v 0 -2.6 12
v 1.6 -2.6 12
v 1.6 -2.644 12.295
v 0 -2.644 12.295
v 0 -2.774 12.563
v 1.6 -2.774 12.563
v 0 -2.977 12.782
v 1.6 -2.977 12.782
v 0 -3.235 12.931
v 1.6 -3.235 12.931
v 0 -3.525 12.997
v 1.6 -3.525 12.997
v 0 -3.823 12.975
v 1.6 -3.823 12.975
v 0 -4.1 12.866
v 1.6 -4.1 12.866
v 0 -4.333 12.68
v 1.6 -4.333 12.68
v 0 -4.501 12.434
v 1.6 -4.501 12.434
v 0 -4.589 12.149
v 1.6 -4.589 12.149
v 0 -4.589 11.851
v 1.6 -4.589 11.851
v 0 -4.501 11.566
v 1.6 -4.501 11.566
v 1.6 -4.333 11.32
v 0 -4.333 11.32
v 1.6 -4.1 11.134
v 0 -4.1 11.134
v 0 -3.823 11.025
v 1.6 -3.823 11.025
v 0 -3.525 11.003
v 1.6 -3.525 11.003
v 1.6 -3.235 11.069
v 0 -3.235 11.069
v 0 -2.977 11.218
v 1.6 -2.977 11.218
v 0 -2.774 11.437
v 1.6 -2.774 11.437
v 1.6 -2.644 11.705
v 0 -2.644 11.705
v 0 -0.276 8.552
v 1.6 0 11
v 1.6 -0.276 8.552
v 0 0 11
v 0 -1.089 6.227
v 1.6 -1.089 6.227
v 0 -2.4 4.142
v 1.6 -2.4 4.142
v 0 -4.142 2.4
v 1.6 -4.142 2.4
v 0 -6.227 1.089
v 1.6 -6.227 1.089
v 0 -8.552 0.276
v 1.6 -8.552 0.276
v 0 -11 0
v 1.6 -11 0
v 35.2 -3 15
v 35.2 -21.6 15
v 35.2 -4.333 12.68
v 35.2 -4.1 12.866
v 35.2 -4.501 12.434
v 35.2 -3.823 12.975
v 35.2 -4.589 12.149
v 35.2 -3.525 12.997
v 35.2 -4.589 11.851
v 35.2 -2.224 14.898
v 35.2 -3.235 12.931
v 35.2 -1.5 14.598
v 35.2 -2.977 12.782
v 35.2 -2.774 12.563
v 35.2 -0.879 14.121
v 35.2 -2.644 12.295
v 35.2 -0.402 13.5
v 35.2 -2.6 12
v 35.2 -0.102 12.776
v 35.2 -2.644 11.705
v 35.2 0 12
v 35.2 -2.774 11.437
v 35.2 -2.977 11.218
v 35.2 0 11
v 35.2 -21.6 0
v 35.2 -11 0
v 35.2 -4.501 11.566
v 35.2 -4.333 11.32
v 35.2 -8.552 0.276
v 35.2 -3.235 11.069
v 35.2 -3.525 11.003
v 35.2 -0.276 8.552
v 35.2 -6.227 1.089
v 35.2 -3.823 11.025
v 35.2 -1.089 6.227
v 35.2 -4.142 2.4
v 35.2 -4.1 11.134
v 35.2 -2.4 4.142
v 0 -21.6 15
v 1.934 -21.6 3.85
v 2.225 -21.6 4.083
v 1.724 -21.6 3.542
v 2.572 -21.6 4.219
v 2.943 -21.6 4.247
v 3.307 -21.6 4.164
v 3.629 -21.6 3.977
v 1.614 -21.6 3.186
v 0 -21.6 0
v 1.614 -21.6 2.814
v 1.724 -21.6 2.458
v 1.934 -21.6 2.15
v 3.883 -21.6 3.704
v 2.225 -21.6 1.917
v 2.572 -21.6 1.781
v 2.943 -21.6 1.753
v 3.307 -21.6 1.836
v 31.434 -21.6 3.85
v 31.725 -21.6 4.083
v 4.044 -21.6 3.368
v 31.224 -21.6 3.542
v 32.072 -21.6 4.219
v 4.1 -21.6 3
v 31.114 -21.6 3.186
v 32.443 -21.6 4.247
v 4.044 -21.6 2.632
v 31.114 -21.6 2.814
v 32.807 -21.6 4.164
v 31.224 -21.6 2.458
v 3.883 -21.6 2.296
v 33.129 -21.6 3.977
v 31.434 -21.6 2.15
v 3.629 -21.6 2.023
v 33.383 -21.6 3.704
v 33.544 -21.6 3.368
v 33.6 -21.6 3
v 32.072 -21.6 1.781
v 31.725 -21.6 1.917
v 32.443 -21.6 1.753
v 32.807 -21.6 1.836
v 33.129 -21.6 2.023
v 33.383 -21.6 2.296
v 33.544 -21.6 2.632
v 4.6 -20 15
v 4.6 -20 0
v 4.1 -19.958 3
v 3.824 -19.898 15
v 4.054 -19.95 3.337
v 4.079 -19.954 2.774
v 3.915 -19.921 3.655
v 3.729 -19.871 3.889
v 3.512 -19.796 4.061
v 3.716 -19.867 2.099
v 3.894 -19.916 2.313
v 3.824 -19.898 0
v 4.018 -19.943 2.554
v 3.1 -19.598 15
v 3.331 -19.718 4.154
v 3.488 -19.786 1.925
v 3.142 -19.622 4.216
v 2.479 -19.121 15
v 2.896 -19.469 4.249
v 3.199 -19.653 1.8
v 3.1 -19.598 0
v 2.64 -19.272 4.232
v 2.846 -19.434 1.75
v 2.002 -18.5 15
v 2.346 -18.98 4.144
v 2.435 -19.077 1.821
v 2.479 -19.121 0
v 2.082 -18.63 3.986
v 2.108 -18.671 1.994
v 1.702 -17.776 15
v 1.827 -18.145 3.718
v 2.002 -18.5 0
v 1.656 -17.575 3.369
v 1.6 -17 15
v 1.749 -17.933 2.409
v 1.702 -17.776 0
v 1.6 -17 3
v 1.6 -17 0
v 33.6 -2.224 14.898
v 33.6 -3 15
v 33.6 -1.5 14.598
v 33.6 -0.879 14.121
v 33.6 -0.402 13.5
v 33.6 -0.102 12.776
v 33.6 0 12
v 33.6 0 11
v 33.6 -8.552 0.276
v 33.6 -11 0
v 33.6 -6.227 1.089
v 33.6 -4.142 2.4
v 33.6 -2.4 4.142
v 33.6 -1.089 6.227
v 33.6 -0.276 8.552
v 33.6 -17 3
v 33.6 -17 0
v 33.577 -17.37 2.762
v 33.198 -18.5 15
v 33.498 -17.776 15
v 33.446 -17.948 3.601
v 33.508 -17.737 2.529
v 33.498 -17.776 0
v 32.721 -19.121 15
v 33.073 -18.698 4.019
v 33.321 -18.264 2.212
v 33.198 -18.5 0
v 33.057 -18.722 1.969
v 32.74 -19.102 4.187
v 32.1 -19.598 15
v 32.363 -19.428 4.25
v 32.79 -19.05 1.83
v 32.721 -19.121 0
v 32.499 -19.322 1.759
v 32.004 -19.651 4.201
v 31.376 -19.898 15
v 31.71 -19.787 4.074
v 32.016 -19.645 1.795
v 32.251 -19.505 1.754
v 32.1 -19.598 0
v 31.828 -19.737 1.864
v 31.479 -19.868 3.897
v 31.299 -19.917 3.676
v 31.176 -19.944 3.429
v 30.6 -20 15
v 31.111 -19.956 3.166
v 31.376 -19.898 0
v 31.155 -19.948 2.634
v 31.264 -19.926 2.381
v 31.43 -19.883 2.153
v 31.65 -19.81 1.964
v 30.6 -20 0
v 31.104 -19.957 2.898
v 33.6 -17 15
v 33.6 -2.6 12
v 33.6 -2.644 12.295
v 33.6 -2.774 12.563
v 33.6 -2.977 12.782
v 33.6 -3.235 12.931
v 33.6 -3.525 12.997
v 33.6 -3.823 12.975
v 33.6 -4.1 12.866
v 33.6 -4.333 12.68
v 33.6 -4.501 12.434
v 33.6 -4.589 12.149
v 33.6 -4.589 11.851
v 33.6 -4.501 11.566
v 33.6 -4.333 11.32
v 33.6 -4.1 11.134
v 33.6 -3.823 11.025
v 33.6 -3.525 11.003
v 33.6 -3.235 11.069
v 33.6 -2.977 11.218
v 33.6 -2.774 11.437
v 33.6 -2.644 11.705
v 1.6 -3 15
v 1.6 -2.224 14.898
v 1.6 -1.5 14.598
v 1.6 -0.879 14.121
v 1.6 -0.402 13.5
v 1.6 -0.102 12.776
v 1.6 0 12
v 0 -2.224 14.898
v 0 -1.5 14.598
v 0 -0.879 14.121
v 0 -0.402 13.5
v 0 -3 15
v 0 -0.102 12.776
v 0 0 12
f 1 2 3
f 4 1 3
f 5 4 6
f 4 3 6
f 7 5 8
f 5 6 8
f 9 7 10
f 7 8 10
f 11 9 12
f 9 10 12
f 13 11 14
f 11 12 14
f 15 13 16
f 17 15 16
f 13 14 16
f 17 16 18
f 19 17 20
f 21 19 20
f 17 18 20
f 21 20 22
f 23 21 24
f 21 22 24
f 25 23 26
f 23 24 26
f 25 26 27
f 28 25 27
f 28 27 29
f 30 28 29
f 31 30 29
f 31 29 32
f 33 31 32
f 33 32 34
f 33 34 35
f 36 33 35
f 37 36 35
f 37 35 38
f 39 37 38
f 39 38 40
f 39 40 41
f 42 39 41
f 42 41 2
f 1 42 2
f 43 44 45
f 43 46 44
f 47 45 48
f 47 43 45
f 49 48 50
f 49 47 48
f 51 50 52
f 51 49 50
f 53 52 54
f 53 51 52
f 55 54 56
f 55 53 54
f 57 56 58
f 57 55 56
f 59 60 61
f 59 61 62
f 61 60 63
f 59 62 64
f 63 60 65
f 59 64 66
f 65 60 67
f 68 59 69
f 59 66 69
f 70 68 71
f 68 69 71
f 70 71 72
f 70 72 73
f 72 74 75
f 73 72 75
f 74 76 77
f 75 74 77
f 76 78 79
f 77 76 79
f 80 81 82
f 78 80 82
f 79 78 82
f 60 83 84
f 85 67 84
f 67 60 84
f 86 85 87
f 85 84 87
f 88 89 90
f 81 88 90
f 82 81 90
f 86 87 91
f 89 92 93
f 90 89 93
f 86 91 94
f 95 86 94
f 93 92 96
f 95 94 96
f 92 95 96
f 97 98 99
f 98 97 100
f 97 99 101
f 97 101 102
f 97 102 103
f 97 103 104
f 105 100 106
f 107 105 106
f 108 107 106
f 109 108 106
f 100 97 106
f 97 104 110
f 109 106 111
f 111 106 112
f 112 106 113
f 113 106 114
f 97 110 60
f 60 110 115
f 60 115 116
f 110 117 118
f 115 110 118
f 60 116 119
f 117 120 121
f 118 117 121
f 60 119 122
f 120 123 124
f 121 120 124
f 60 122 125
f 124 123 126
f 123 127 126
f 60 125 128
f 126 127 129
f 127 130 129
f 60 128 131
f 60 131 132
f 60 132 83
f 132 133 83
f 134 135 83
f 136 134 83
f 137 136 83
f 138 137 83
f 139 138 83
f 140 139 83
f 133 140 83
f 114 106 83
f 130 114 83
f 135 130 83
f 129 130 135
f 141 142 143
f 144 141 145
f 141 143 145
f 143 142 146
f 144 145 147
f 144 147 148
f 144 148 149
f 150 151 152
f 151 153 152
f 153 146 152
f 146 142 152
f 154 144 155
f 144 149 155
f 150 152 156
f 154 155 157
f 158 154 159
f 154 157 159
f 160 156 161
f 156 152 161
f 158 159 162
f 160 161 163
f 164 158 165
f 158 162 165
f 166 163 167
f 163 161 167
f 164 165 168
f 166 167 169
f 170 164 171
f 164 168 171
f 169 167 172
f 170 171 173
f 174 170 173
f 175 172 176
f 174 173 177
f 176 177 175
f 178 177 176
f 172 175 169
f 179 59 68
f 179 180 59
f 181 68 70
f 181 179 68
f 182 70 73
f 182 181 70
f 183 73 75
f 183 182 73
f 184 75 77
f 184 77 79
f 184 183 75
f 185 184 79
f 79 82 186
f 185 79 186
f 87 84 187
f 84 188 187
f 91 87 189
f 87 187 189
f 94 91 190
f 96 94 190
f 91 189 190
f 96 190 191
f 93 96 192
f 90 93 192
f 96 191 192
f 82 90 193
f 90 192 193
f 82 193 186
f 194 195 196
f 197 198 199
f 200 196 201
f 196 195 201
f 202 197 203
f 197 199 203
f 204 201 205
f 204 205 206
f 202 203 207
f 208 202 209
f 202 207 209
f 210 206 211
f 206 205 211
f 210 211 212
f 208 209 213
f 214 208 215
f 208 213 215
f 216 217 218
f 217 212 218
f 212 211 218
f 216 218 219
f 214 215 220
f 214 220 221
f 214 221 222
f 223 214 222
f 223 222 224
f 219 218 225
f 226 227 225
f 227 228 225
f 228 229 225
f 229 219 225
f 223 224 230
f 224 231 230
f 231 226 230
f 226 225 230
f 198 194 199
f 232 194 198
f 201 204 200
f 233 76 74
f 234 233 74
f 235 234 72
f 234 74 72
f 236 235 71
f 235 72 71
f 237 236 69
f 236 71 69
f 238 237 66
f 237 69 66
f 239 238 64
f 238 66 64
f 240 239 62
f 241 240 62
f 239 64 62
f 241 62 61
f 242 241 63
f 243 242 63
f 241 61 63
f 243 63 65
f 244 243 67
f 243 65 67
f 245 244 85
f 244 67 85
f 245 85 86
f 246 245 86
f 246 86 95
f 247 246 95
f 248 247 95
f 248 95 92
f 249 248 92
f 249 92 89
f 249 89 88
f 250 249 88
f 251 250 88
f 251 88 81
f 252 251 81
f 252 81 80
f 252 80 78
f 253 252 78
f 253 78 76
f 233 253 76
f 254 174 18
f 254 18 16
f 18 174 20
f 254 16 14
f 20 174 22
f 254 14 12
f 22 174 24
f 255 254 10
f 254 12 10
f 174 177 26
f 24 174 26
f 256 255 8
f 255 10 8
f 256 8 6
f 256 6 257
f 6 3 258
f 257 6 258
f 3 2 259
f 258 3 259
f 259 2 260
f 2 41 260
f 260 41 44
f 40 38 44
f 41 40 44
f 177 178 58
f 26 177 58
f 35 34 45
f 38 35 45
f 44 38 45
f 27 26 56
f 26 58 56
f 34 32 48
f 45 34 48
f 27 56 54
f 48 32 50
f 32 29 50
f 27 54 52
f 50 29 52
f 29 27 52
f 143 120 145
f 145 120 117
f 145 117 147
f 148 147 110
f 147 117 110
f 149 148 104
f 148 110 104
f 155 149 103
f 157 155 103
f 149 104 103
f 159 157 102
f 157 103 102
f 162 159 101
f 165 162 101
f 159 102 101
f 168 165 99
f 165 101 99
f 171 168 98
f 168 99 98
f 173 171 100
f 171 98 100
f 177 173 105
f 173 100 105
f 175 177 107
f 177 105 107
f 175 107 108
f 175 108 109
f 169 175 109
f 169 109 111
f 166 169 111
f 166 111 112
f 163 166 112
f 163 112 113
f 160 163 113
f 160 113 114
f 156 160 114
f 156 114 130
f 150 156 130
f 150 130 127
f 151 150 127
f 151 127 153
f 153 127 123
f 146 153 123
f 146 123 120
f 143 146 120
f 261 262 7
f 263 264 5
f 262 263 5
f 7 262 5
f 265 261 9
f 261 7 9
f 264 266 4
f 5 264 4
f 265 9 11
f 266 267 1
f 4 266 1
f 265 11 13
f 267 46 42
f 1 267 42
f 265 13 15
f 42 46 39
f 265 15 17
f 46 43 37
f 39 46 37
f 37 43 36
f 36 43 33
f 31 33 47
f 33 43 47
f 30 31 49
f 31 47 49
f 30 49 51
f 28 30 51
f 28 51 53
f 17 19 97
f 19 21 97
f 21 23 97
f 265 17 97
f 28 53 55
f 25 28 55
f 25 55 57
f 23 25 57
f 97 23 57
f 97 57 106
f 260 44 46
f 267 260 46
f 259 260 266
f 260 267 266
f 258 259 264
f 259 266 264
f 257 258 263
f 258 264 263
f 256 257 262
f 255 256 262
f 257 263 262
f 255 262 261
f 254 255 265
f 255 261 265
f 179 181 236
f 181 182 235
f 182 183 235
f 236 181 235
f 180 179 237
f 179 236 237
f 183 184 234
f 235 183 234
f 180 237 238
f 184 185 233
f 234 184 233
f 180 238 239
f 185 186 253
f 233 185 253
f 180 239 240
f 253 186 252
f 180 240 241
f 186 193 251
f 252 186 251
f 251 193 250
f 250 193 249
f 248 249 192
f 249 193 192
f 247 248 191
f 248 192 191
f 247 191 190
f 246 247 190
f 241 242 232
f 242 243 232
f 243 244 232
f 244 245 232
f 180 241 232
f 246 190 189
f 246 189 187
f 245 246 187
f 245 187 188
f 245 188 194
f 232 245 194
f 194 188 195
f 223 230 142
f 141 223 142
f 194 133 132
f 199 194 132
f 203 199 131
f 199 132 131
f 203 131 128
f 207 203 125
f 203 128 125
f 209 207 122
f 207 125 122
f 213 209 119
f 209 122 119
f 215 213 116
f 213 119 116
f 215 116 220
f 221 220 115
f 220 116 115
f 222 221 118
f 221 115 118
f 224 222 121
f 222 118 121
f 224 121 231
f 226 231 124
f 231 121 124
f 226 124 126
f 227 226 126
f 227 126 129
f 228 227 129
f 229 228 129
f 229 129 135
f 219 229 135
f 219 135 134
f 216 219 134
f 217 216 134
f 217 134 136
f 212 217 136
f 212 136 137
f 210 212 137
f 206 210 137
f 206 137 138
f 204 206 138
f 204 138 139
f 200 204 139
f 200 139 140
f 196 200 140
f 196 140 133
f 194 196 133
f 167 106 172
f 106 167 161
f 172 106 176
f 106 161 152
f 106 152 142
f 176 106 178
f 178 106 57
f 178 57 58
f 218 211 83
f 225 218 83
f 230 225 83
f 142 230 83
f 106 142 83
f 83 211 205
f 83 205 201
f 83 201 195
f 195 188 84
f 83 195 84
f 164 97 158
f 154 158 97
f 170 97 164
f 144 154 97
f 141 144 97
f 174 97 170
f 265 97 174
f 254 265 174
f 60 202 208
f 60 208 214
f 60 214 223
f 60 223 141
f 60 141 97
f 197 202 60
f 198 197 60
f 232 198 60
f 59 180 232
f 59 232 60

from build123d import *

# Parameters (mm, degrees)
F1_DEPTH = 15
F2_R     = 1.25
F3_DEPTH = 25
F4_R     = 1
F5_DEPTH = 35.201
F6_R     = 3
F7_R     = 11


with BuildPart() as f1:
    # F0 (on Top) → F1 (new body)
    with BuildSketch(Plane.XY):
        with BuildLine():
            Line((1.6, 0), (0, 0))
            Line((0, 0), (0, -21.6))
            Line((0, -21.6), (35.2, -21.6))
            Line((35.2, -21.6), (35.2, 0))
            Line((35.2, 0), (33.6, 0))
            Line((33.6, 0), (33.6, -17))
            ThreePointArc((33.6, -17), (32.72132, -19.12132), (30.6, -20))
            Line((30.6, -20), (4.6, -20))
            ThreePointArc((4.6, -20), (2.47868, -19.12132), (1.6, -17))
            Line((1.6, -17), (1.6, 0))
        make_face()
    extrude(amount=F1_DEPTH)

    # F2 (on face) → F3 (cut)
    with BuildSketch(Plane.XZ.offset(21.6)):
        with Locations((2.85, 3)):
            Circle(F2_R)
        with Locations((32.35, 3)):
            Circle(F2_R)
    extrude(amount=-F3_DEPTH, mode=Mode.SUBTRACT)

    # F4 (on face) → F5 (cut, through all)
    with BuildSketch(Plane.YZ.offset(35.2)):
        with Locations((-3.6, 12)):
            Circle(F4_R)
    extrude(amount=-F5_DEPTH, mode=Mode.SUBTRACT)

    # F6
    f6_edges = [f1.edges().sort_by_distance(p)[0] for p in [
        (0.8, 0, 15),
        (34.4, 0, 15),
    ]]
    fillet(f6_edges, radius=F6_R)

    # F7
    f7_edges = [f1.edges().sort_by_distance(p)[0] for p in [
        (34.4, 0, 0),
        (0.8, 0, 0),
    ]]
    fillet(f7_edges, radius=F7_R)


solid = f1.part
